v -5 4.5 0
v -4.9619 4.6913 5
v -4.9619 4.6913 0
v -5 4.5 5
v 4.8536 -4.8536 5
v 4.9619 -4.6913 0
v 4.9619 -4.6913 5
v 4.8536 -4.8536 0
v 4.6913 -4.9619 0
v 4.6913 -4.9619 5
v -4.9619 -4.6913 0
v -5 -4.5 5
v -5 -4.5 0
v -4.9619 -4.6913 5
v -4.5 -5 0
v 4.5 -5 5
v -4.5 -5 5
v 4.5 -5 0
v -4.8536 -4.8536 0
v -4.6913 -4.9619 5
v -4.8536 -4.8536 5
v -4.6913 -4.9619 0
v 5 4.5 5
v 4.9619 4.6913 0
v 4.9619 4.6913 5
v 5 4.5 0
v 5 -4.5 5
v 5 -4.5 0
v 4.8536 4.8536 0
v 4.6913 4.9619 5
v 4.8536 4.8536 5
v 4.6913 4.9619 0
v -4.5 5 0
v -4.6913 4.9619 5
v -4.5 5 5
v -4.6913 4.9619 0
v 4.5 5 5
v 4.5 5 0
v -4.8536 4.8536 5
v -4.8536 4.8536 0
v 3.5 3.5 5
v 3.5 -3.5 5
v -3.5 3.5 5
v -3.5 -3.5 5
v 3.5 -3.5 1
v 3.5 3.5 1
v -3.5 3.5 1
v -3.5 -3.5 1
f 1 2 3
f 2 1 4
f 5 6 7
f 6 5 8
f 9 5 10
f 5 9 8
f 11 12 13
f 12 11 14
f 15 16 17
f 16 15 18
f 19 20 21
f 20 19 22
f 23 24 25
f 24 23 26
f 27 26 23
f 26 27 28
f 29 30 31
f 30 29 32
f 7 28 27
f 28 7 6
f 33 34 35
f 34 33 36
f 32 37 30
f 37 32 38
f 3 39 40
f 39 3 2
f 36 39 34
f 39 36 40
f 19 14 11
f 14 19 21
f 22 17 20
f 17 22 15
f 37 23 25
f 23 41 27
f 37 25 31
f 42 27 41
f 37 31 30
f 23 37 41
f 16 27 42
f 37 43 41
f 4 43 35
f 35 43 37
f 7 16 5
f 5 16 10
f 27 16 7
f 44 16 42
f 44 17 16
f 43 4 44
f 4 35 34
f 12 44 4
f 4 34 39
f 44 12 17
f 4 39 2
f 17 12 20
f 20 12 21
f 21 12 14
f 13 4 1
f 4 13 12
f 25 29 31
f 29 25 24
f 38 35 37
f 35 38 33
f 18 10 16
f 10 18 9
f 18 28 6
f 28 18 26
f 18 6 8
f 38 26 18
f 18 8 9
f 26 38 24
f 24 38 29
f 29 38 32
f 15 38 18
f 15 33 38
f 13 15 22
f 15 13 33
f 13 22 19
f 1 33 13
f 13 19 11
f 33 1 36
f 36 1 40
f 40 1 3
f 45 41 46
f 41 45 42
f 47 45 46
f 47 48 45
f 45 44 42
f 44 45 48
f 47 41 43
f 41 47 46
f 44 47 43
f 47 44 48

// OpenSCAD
//------------------------------------------------------------------------------------------
// THIS CODE WAS GENERATED WITH GRAPHSCAD (C)C.levastre 2017
// IF U LIKE GRAPHSCAD PLEASE DONATE ON BLOG//------------------------------------------------------------------------------------------
// D:\workspace\graphscad\graphscadfiles/display.scad
//------------------------------------------------------------------------------------------
// Graphscad is a graphical nodal editor to create .SCAD files
//
// More info here : http://graphscad.free.fr
//
// Scad Files created with Graphscad can be edited by graphscad
// Scad Files created with Graphscad can be read by Openscad
//
//------------------------------------------------------------------------------------------
$assembled=true;
$debug=true;
/*------------------- Headers --------------------------------*/
/*------------------- declared modules --------------------------------*/
/*------------------- Other Headers --------------------------------*/
/*------------------- default module --------------------------------*/
/* force parameters for default module if they are connected to declaremodule */
/* force functions for default module if they are connected to declaremodule */
module display()
{
 /*------------------- isolated output objects --------------------------------*/
 /*------------------- final objects output --------------------------------*/
 function node_box_outobject_matrix(i=0,j=0,k=0,l=0,m=0,n=0) = translate([0,0,0]);
 module node_box_outobject(i=0,j=0,k=0,l=0,m=0,n=0)
 {
  hull()
  {
   translate([-((((10)/2))-(max(0.5,0.00001))),-((((10)/2))-(max(0.5,0.00001))),0]) cylinder(r=max(0.5,0.00001),h=(5),$fn=16);
   translate([-((((10)/2))-(max(0.5,0.00001))), ((((10)/2))-(max(0.5,0.00001))),0]) cylinder(r=max(0.5,0.00001),h=(5),$fn=16);
   translate([ ((((10)/2))-(max(0.5,0.00001))),-((((10)/2))-(max(0.5,0.00001))),0]) cylinder(r=max(0.5,0.00001),h=(5),$fn=16);
   translate([ ((((10)/2))-(max(0.5,0.00001))), ((((10)/2))-(max(0.5,0.00001))),0]) cylinder(r=max(0.5,0.00001),h=(5),$fn=16);
  }
 }
 function node_box_inobject_matrix(i=0,j=0,k=0,l=0,m=0,n=0) = translate([0,0,0]);
 module node_box_inobject(i=0,j=0,k=0,l=0,m=0,n=0)
 {
  translate([ 0,0,1])hull()
  {
   translate([-((((10)/2))-((max(0.5,0.00001))+(1))),-((((10)/2))-((max(0.5,0.00001))+(1))),0]) cylinder(r=max(((0.5)-(1)),0.00001),h=(((5))-(1)+0.01),$fn=16);
   translate([-((((10)/2))-((max(0.5,0.00001))+(1))), ((((10)/2))-((max(0.5,0.00001))+(1))),0]) cylinder(r=max(((0.5)-(1)),0.00001),h=(((5))-(1)+0.01),$fn=16);
   translate([ ((((10)/2))-((max(0.5,0.00001))+(1))),-((((10)/2))-((max(0.5,0.00001))+(1))),0]) cylinder(r=max(((0.5)-(1)),0.00001),h=(((5))-(1)+0.01),$fn=16);
   translate([ ((((10)/2))-((max(0.5,0.00001))+(1))), ((((10)/2))-((max(0.5,0.00001))+(1))),0]) cylinder(r=max(((0.5)-(1)),0.00001),h=(((5))-(1)+0.01),$fn=16);
  }
 }
 function node_box_matrix(i=0,j=0,k=0,l=0,m=0,n=0) = translate([0,0,0]);
 module node_box(i=0,j=0,k=0,l=0,m=0,n=0)
 {
  difference()
  {
   {
    hull()
    {
     translate([-((((10)/2))-(max(0.5,0.00001))),-((((10)/2))-(max(0.5,0.00001))),0]) cylinder(r=max(0.5,0.00001),h=(5),$fn=16);
     translate([-((((10)/2))-(max(0.5,0.00001))), ((((10)/2))-(max(0.5,0.00001))),0]) cylinder(r=max(0.5,0.00001),h=(5),$fn=16);
     translate([ ((((10)/2))-(max(0.5,0.00001))),-((((10)/2))-(max(0.5,0.00001))),0]) cylinder(r=max(0.5,0.00001),h=(5),$fn=16);
     translate([ ((((10)/2))-(max(0.5,0.00001))), ((((10)/2))-(max(0.5,0.00001))),0]) cylinder(r=max(0.5,0.00001),h=(5),$fn=16);
    }
   }
   {
    translate([ 0,0,1])hull()
    {
     translate([-((((10)/2))-((max(0.5,0.00001))+(1))),-((((10)/2))-((max(0.5,0.00001))+(1))),0]) cylinder(r=max(((0.5)-(1)),0.00001),h=(((5))-(1)+0.01),$fn=16);
     translate([-((((10)/2))-((max(0.5,0.00001))+(1))), ((((10)/2))-((max(0.5,0.00001))+(1))),0]) cylinder(r=max(((0.5)-(1)),0.00001),h=(((5))-(1)+0.01),$fn=16);
     translate([ ((((10)/2))-((max(0.5,0.00001))+(1))),-((((10)/2))-((max(0.5,0.00001))+(1))),0]) cylinder(r=max(((0.5)-(1)),0.00001),h=(((5))-(1)+0.01),$fn=16);
     translate([ ((((10)/2))-((max(0.5,0.00001))+(1))), ((((10)/2))-((max(0.5,0.00001))+(1))),0]) cylinder(r=max(((0.5)-(1)),0.00001),h=(((5))-(1)+0.01),$fn=16);
    }
   }
  }
 }
 /*--call non input node--*/
 node_box();
}
display();
/*--------------------------------------------------------------------------------------------------------
 Graphscad Utils functions
 This code is Used By Graphscad Nodal Editor to generate SCAD files
--------------------------------------------------------------------------------------------------------*/
function det4x4(a) =
a[0][0]*a[1][1]*a[2][2]*a[3][3] + a[0][0]*a[1][2]*a[2][3]*a[3][1] + a[0][0]*a[1][3]*a[2][1]*a[3][2]
+ a[0][1]*a[1][0]*a[2][3]*a[3][2] + a[0][1]*a[1][2]*a[2][0]*a[3][3] + a[0][1]*a[1][3]*a[2][2]*a[3][0]
+ a[0][2]*a[1][0]*a[2][1]*a[3][3] + a[0][2]*a[1][1]*a[2][3]*a[3][0] + a[0][2]*a[1][3]*a[2][0]*a[3][1]
+ a[0][3]*a[1][0]*a[2][2]*a[3][1] + a[0][3]*a[1][1]*a[2][0]*a[3][2] + a[0][3]*a[1][2]*a[2][1]*a[3][0]
- a[0][0]*a[1][1]*a[2][3]*a[3][2] - a[0][0]*a[1][2]*a[2][1]*a[3][3] - a[0][0]*a[1][3]*a[2][2]*a[3][1]
- a[0][1]*a[1][0]*a[2][2]*a[3][3] - a[0][1]*a[1][2]*a[2][3]*a[3][0] - a[0][1]*a[1][3]*a[2][0]*a[3][2]
- a[0][2]*a[1][0]*a[2][3]*a[3][1] - a[0][2]*a[1][1]*a[2][0]*a[3][3] - a[0][2]*a[1][3]*a[2][1]*a[3][0]
- a[0][3]*a[1][0]*a[2][1]*a[3][2] - a[0][3]*a[1][1]*a[2][2]*a[3][0] - a[0][3]*a[1][2]*a[2][0]*a[3][1];
function invb00(a) = a[1][1]*a[2][2]*a[3][3] + a[1][2]*a[2][3]*a[3][1] + a[1][3]*a[2][1]*a[3][2] - a[1][1]*a[2][3]*a[3][2] - a[1][2]*a[2][1]*a[3][3] - a[1][3]*a[2][2]*a[3][1];
function invb01(a) = a[0][1]*a[2][3]*a[3][2] + a[0][2]*a[2][1]*a[3][3] + a[0][3]*a[2][2]*a[3][1] - a[0][1]*a[2][2]*a[3][3] - a[0][2]*a[2][3]*a[3][1] - a[0][3]*a[2][1]*a[3][2];
function invb02(a) = a[0][1]*a[1][2]*a[3][3] + a[0][2]*a[1][3]*a[3][1] + a[0][3]*a[1][1]*a[3][2] - a[0][1]*a[1][3]*a[3][2] - a[0][2]*a[1][1]*a[3][3] - a[0][3]*a[1][2]*a[3][1];
function invb03(a) = a[0][1]*a[1][3]*a[2][2] + a[0][2]*a[1][1]*a[2][3] + a[0][3]*a[1][2]*a[2][1] - a[0][1]*a[1][2]*a[2][3] - a[0][2]*a[1][3]*a[2][1] - a[0][3]*a[1][1]*a[2][2];
function invb10(a) = a[1][0]*a[2][3]*a[3][2] + a[1][2]*a[2][0]*a[3][3] + a[1][3]*a[2][2]*a[3][0] - a[1][0]*a[2][2]*a[3][3] - a[1][2]*a[2][3]*a[3][0] - a[1][3]*a[2][0]*a[3][2];
function invb11(a) = a[0][0]*a[2][2]*a[3][3] + a[0][2]*a[2][3]*a[3][0] + a[0][3]*a[2][0]*a[3][2] - a[0][0]*a[2][3]*a[3][2] - a[0][2]*a[2][0]*a[3][3] - a[0][3]*a[2][2]*a[3][0];
function invb12(a) = a[0][0]*a[1][3]*a[3][2] + a[0][2]*a[1][0]*a[3][3] + a[0][3]*a[1][2]*a[3][0] - a[0][0]*a[1][2]*a[3][3] - a[0][2]*a[1][3]*a[3][0] - a[0][3]*a[1][0]*a[3][2];
function invb13(a) = a[0][0]*a[1][2]*a[2][3] + a[0][2]*a[1][3]*a[2][0] + a[0][3]*a[1][0]*a[2][2] - a[0][0]*a[1][3]*a[2][2] - a[0][2]*a[1][0]*a[2][3] - a[0][3]*a[1][2]*a[2][0];
function invb20(a) = a[1][0]*a[2][1]*a[3][3] + a[1][1]*a[2][3]*a[3][0] + a[1][3]*a[2][0]*a[3][1] - a[1][0]*a[2][3]*a[3][1] - a[1][1]*a[2][0]*a[3][3] - a[1][3]*a[2][1]*a[3][0];
function invb21(a) = a[0][0]*a[2][3]*a[3][1] + a[0][1]*a[2][0]*a[3][3] + a[0][3]*a[2][1]*a[3][0] - a[0][0]*a[2][1]*a[3][3] - a[0][1]*a[2][3]*a[3][0] - a[0][3]*a[2][0]*a[3][1];
function invb22(a) = a[0][0]*a[1][1]*a[3][3] + a[0][1]*a[1][3]*a[3][0] + a[0][3]*a[1][0]*a[3][1] - a[0][0]*a[1][3]*a[3][1] - a[0][1]*a[1][0]*a[3][3] - a[0][3]*a[1][1]*a[3][0];
function invb23(a) = a[0][0]*a[1][3]*a[2][1] + a[0][1]*a[1][0]*a[2][3] + a[0][3]*a[1][1]*a[2][0] - a[0][0]*a[1][1]*a[2][3] - a[0][1]*a[1][3]*a[2][0] - a[0][3]*a[1][0]*a[2][1];
function invb30(a) = a[1][0]*a[2][2]*a[3][1] + a[1][1]*a[2][0]*a[3][2] + a[1][2]*a[2][1]*a[3][0] - a[1][0]*a[2][1]*a[3][2] - a[1][1]*a[2][2]*a[3][0] - a[1][2]*a[2][0]*a[3][1];
function invb31(a) = a[0][0]*a[2][1]*a[3][2] + a[0][1]*a[2][2]*a[3][0] + a[0][2]*a[2][0]*a[3][1] - a[0][0]*a[2][2]*a[3][1] - a[0][1]*a[2][0]*a[3][2] - a[0][2]*a[2][1]*a[3][0];
function invb32(a) = a[0][0]*a[1][2]*a[3][1] + a[0][1]*a[1][0]*a[3][2] + a[0][2]*a[1][1]*a[3][0] - a[0][0]*a[1][1]*a[3][2] - a[0][1]*a[1][2]*a[3][0] - a[0][2]*a[1][0]*a[3][1];
function invb33(a) = a[0][0]*a[1][1]*a[2][2] + a[0][1]*a[1][2]*a[2][0] + a[0][2]*a[1][0]*a[2][1] - a[0][0]*a[1][2]*a[2][1] - a[0][1]*a[1][0]*a[2][2] - a[0][2]*a[1][1]*a[2][0];
function inv4x4(a)= (1/det4x4(a))*[
[invb00(a),invb01(a),invb02(a),invb03(a)],
[invb10(a),invb11(a),invb12(a),invb13(a)],
[invb20(a),invb21(a),invb22(a),invb23(a)],
[invb30(a),invb31(a),invb32(a),invb33(a)]];
function onlytranslate(a)=  [
                       [1,0,0,a[0][3]],
                       [0,1,0,a[1][3]],
                       [0,0,1,a[2][3]],
                       [0,0,0,1]];
function negonlytranslate(a)=[
                       [1,0,0,-a[0][3]],
                       [0,1,0,-a[1][3]],
                       [0,0,1,-a[2][3]],
                       [0,0,0,1]];
function lookatvec(t,parentmat) = [t[0]-parentmat[0][3],
                                t[1]-parentmat[1][3],
                                t[2]-parentmat[2][3]];
/*
             rx = '0'
             ry = 'acos('+tz+'/norm(['+tx+','+ty+','+tz+']))'
             rz = 'atan2('+ty+','+tx+')'
*/
function lookatrot(t,parentmat) = [0,
                                acos((t[2]-parentmat[2][3])/norm(lookatvec(t,parentmat))),
                                atan2(t[1]-parentmat[1][3],t[0]-parentmat[0][3])];
function gettranslation(m) = [m[0][3],m[1][3],m[2][3]];
function vectormulmatrix(v,m) = m*v;
function vectorlength(v) = norm(v);
function vectorx(v) = v[0];
function vectory(v) = v[1];
function vectorz(v) = v[2];
function vectoradd(a,b) = (a+b);
function vectorsub(a,b) = (a-b);
function vectormul(a,b) = (a*b);
function vectordiv(a,b) = (a*(1/b));
function scale(v)=[[v[0],0,0,0],
                   [0,v[1],0,0],
                   [0,0,v[2],0],
                   [0,0,0,1]];
function rotatex(a)=[[1,0,0,0],
                     [0,cos(a),-sin(a),0],
                     [0,sin(a),cos(a),0],
                     [0,0,0,1]];
function rotatey(a)=[[cos(a),0,sin(a),0],
                     [0,1,0,0],
                     [-sin(a),0,cos(a),0],
                     [0,0,0,1]];
function rotatez(a)=[[cos(a),-sin(a),0,0],
                     [sin(a),cos(a),0,0],
                     [0,0,1,0],
                     [0,0,0,1]];
function rotatea(c,s,l,m,n)=[[l*l*(1-c)+c,m*l*(1-c)-n*s,n*l*(1-c)+m*s,0],
                             [l*m*(1-c)+n*s,m*m*(1-c)+c,n*m*(1-c)-l*s,0],
                             [l*n*(1-c)-m*s,m*n*(1-c)+l*s,n*n*(1-c)+c,0],
                             [0,0,0,1]];
function rotateanv(a,nv)=rotatea(cos(a),sin(a),nv[0],nv[1],nv[2]);
function rotate(a,v, normV=true)=(v==undef)?rotatez(a[2])*rotatey(a[1])*rotatex(a[0]):
                     normV ? rotateanv(a,v/sqrt(v*v)) : rotateanv(a,v);
function translate(v)=[[1,0,0,v[0]],
                       [0,1,0,v[1]],
                       [0,0,1,v[2]],
                       [0,0,0,1]];
function mirrorabc(a,b,c)=[[1-2*a*a,-2*a*b,-2*a*c,0],
                           [-2*a*b,1-2*b*b,-2*b*c,0],
                           [-2*a*c,-2*b*c,1-2*c*c,0],
                           [0,0,0,1]];
function mirrornv(nv)=mirrorabc(nv[0],nv[1],nv[2]);
function mirror(v)=mirrornv(v/sqrt(v*v));
